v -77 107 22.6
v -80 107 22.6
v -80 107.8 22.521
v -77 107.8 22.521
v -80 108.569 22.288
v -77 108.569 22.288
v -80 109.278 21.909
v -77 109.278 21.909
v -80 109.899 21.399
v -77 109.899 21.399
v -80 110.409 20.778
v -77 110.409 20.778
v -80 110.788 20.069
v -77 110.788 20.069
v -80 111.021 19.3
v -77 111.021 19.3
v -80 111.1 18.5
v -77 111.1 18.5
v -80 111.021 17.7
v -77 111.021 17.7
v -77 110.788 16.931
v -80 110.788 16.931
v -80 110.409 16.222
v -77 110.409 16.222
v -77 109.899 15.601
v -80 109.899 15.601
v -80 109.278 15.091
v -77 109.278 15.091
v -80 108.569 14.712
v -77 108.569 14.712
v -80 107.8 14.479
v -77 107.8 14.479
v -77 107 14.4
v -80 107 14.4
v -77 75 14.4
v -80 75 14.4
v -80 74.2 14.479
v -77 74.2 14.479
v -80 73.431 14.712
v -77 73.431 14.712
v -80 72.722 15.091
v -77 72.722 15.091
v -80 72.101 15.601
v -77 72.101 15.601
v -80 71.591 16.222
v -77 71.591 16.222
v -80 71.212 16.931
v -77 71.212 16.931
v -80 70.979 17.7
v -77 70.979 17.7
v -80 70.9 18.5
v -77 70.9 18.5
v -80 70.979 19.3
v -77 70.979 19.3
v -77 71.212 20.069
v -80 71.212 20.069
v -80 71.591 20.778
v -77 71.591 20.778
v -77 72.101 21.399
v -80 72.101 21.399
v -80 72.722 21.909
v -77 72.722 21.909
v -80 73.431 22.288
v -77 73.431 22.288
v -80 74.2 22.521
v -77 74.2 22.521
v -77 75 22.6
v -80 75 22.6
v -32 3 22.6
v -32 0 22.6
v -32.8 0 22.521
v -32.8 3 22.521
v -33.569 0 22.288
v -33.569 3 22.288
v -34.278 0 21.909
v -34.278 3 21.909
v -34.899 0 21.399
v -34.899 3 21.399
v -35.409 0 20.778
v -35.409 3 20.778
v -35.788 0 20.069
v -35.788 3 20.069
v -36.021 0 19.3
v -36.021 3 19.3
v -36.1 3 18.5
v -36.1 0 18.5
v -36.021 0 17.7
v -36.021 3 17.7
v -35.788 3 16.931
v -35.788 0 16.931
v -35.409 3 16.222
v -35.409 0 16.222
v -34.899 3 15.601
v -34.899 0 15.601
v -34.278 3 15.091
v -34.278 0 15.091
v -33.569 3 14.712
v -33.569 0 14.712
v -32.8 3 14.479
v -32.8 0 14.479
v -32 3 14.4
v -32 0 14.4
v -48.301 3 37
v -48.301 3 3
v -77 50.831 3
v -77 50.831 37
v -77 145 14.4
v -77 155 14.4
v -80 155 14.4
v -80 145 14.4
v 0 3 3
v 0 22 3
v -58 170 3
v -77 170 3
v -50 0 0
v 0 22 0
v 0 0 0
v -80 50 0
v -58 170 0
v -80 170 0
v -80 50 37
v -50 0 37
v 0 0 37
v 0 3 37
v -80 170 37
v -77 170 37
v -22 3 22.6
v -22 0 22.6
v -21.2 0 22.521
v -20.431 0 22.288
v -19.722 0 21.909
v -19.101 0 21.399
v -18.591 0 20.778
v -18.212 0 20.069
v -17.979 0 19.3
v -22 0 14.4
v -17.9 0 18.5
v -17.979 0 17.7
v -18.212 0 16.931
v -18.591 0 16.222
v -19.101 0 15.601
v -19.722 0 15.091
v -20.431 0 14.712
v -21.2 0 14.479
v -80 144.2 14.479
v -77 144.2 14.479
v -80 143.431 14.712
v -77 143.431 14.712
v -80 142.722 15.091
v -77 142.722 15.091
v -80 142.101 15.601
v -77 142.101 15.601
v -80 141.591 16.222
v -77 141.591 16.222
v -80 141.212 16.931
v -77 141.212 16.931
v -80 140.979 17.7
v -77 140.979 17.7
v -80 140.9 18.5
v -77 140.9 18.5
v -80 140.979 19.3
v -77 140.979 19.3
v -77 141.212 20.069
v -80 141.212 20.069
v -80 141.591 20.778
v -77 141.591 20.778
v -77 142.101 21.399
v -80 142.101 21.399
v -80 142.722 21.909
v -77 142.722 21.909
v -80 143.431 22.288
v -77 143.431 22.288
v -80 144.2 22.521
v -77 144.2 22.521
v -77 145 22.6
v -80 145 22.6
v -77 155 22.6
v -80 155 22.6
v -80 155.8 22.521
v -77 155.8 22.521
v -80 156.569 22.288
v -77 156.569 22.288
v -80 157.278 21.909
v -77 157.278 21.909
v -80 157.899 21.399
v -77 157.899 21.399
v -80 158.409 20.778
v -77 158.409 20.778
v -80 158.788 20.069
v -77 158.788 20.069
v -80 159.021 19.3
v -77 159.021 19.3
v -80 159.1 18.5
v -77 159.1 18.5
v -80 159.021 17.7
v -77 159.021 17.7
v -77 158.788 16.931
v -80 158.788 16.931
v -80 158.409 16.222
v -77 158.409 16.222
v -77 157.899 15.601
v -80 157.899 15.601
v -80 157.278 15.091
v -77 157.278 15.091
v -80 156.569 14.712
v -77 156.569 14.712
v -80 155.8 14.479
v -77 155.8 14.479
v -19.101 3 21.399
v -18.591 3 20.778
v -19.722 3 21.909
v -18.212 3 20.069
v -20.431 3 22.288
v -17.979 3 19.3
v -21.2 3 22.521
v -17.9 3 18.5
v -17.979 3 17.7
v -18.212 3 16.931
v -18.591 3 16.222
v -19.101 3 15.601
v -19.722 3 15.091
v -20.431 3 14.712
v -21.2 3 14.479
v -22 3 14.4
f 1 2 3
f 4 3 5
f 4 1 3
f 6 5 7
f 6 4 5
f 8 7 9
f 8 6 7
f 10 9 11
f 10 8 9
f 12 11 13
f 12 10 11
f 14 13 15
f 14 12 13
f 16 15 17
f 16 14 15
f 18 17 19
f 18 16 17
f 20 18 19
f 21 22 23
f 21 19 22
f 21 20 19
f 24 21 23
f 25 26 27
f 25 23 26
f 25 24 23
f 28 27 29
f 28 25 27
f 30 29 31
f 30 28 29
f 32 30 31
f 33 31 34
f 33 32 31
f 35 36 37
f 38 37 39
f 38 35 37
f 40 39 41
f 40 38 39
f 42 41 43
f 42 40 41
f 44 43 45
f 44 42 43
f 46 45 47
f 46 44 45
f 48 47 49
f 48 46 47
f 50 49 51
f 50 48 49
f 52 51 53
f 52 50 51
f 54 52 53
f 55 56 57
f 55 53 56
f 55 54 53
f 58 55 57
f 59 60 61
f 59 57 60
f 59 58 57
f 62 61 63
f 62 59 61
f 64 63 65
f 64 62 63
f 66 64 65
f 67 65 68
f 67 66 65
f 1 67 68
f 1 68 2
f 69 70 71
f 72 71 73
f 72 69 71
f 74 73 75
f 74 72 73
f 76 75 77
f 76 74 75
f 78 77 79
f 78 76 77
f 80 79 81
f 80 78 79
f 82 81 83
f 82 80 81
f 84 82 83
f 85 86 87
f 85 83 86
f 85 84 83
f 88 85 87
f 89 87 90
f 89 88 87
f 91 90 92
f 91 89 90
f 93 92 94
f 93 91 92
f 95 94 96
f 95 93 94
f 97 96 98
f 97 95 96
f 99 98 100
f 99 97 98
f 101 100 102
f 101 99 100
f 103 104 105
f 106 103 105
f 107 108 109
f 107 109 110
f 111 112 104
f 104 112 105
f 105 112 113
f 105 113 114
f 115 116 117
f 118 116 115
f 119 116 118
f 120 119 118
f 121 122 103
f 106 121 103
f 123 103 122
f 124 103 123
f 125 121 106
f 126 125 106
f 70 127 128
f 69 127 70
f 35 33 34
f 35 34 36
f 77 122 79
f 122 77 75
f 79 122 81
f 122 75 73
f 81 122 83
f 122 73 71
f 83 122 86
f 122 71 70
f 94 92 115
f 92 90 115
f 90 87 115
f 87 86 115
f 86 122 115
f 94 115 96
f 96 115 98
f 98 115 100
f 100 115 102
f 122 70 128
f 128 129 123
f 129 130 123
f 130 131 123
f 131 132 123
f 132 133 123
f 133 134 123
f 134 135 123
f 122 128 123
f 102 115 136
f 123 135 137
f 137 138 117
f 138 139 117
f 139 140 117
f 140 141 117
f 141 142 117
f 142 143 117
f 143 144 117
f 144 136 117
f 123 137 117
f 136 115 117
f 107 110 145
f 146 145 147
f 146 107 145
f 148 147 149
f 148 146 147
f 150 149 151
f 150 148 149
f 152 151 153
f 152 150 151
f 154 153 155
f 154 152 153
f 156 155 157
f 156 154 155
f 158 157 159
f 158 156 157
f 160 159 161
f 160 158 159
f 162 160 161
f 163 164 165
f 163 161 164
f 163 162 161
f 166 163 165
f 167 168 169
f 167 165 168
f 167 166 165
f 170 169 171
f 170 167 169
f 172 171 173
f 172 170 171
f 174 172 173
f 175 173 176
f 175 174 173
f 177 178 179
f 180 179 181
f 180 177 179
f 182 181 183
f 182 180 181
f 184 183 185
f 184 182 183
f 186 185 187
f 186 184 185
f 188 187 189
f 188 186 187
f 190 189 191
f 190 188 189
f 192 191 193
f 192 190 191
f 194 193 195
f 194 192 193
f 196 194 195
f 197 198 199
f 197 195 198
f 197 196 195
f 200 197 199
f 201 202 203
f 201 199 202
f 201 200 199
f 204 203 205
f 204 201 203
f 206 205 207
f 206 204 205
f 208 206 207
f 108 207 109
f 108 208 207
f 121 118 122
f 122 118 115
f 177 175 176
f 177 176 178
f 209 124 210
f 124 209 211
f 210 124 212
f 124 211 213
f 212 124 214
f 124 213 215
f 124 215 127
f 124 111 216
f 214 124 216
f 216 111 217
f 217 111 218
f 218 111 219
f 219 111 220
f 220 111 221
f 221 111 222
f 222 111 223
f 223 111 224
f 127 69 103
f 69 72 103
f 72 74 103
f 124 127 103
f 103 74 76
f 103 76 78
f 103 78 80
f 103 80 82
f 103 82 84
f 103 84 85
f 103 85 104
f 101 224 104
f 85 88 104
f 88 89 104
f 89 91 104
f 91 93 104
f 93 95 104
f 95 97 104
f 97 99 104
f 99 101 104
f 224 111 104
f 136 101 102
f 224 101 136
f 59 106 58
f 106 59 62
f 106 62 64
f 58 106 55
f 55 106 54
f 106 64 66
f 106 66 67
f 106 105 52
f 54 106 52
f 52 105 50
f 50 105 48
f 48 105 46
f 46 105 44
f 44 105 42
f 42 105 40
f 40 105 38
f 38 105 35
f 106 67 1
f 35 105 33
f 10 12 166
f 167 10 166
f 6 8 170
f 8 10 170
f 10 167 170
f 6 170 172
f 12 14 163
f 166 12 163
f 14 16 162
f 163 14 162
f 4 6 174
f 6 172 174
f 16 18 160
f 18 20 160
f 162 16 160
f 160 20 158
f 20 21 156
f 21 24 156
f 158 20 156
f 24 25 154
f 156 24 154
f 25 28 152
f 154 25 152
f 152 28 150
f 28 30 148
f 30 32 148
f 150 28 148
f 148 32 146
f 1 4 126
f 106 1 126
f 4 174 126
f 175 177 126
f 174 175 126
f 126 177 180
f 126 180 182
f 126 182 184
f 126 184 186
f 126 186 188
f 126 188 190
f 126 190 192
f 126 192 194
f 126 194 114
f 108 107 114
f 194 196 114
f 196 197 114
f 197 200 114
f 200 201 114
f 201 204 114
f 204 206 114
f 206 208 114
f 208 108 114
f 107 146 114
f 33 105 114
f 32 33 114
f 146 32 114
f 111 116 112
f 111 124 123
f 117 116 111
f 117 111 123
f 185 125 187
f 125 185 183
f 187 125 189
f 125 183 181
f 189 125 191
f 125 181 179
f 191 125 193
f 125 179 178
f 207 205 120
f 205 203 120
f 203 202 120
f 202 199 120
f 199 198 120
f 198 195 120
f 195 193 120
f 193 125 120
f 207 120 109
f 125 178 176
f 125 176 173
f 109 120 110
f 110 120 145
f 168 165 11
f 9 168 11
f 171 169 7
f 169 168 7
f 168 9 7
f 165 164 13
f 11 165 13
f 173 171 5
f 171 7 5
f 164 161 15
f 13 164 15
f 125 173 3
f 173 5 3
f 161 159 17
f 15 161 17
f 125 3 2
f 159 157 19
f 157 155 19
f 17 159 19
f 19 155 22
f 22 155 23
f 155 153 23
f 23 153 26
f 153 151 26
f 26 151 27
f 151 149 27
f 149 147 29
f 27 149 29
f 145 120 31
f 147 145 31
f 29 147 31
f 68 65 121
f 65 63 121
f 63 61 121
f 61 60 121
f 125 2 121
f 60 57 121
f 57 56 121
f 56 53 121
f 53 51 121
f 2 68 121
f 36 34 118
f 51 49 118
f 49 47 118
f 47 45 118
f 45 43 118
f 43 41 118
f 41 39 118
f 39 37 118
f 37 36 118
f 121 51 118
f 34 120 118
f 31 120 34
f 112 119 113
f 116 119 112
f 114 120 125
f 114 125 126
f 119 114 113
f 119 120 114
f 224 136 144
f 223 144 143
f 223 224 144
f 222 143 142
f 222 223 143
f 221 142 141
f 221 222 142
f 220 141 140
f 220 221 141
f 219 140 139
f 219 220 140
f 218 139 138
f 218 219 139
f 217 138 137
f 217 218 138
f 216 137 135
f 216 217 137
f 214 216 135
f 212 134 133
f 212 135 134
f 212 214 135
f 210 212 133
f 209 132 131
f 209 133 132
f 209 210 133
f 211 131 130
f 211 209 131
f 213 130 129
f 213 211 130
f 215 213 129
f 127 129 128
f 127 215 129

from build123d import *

# Parameters (mm, degrees)
EXTRUDE_1_DEPTH     = 37
EXTRUDE_2_DEPTH     = 3
CUT_EXTRUDE_1_DEPTH = 191.257719948
CUT_EXTRUDE_2_DEPTH = 189.833259782


with BuildPart() as part:
    # 草图1 → 凸台-拉伸1 (new body)
    with BuildSketch(Plane.XY):
        Polygon((0, 3), (-48.301428863, 3), (-77, 50.830951895), (-77, 170), (-80, 170), (-80, 50), (-50, 0), (0, 0), align=None)
    extrude(amount=EXTRUDE_1_DEPTH)

    # 草图3 → 凸台-拉伸2 (add)
    with BuildSketch(Plane(origin=(0, 0, 0), x_dir=(-1, 0, 0), z_dir=(0, 0, -1))):
        Polygon((77, 170), (58, 170), (0, 22), (0, 3), (48.301428863, 3), (77, 50.830951895), align=None)
    extrude(amount=-EXTRUDE_2_DEPTH)

    # 草图4 → 切除-拉伸1 (cut, through all)
    with BuildSketch(Plane(origin=(-77, 0, 0), x_dir=(0, 0, -1), z_dir=(1, 0, 0))):
        with BuildLine():
            Line((-14.4, 155), (-14.4, 145))
            ThreePointArc((-14.4, 145), (-18.5, 140.9), (-22.6, 145))
            Line((-22.6, 145), (-22.6, 155))
            ThreePointArc((-22.6, 155), (-18.5, 159.1), (-14.4, 155))
        make_face()
        with BuildLine():
            Line((-14.4, 107), (-14.4, 75))
            ThreePointArc((-14.4, 75), (-18.5, 70.9), (-22.6, 75))
            Line((-22.6, 75), (-22.6, 107))
            ThreePointArc((-22.6, 107), (-18.5, 111.1), (-14.4, 107))
        make_face()
    extrude(amount=-CUT_EXTRUDE_1_DEPTH, mode=Mode.SUBTRACT)

    # 草图5 → 切除-拉伸2 (cut, through all)
    with BuildSketch(Plane(origin=(0, 3, 0), x_dir=(1, 0, 0), z_dir=(0, 1, 0))):
        with BuildLine():
            Line((-22, -22.6), (-32, -22.6))
            ThreePointArc((-32, -22.6), (-36.1, -18.5), (-32, -14.4))
            Line((-32, -14.4), (-22, -14.4))
            ThreePointArc((-22, -14.4), (-17.9, -18.5), (-22, -22.6))
        make_face()
    extrude(amount=-CUT_EXTRUDE_2_DEPTH, mode=Mode.SUBTRACT)


solid = part.part
